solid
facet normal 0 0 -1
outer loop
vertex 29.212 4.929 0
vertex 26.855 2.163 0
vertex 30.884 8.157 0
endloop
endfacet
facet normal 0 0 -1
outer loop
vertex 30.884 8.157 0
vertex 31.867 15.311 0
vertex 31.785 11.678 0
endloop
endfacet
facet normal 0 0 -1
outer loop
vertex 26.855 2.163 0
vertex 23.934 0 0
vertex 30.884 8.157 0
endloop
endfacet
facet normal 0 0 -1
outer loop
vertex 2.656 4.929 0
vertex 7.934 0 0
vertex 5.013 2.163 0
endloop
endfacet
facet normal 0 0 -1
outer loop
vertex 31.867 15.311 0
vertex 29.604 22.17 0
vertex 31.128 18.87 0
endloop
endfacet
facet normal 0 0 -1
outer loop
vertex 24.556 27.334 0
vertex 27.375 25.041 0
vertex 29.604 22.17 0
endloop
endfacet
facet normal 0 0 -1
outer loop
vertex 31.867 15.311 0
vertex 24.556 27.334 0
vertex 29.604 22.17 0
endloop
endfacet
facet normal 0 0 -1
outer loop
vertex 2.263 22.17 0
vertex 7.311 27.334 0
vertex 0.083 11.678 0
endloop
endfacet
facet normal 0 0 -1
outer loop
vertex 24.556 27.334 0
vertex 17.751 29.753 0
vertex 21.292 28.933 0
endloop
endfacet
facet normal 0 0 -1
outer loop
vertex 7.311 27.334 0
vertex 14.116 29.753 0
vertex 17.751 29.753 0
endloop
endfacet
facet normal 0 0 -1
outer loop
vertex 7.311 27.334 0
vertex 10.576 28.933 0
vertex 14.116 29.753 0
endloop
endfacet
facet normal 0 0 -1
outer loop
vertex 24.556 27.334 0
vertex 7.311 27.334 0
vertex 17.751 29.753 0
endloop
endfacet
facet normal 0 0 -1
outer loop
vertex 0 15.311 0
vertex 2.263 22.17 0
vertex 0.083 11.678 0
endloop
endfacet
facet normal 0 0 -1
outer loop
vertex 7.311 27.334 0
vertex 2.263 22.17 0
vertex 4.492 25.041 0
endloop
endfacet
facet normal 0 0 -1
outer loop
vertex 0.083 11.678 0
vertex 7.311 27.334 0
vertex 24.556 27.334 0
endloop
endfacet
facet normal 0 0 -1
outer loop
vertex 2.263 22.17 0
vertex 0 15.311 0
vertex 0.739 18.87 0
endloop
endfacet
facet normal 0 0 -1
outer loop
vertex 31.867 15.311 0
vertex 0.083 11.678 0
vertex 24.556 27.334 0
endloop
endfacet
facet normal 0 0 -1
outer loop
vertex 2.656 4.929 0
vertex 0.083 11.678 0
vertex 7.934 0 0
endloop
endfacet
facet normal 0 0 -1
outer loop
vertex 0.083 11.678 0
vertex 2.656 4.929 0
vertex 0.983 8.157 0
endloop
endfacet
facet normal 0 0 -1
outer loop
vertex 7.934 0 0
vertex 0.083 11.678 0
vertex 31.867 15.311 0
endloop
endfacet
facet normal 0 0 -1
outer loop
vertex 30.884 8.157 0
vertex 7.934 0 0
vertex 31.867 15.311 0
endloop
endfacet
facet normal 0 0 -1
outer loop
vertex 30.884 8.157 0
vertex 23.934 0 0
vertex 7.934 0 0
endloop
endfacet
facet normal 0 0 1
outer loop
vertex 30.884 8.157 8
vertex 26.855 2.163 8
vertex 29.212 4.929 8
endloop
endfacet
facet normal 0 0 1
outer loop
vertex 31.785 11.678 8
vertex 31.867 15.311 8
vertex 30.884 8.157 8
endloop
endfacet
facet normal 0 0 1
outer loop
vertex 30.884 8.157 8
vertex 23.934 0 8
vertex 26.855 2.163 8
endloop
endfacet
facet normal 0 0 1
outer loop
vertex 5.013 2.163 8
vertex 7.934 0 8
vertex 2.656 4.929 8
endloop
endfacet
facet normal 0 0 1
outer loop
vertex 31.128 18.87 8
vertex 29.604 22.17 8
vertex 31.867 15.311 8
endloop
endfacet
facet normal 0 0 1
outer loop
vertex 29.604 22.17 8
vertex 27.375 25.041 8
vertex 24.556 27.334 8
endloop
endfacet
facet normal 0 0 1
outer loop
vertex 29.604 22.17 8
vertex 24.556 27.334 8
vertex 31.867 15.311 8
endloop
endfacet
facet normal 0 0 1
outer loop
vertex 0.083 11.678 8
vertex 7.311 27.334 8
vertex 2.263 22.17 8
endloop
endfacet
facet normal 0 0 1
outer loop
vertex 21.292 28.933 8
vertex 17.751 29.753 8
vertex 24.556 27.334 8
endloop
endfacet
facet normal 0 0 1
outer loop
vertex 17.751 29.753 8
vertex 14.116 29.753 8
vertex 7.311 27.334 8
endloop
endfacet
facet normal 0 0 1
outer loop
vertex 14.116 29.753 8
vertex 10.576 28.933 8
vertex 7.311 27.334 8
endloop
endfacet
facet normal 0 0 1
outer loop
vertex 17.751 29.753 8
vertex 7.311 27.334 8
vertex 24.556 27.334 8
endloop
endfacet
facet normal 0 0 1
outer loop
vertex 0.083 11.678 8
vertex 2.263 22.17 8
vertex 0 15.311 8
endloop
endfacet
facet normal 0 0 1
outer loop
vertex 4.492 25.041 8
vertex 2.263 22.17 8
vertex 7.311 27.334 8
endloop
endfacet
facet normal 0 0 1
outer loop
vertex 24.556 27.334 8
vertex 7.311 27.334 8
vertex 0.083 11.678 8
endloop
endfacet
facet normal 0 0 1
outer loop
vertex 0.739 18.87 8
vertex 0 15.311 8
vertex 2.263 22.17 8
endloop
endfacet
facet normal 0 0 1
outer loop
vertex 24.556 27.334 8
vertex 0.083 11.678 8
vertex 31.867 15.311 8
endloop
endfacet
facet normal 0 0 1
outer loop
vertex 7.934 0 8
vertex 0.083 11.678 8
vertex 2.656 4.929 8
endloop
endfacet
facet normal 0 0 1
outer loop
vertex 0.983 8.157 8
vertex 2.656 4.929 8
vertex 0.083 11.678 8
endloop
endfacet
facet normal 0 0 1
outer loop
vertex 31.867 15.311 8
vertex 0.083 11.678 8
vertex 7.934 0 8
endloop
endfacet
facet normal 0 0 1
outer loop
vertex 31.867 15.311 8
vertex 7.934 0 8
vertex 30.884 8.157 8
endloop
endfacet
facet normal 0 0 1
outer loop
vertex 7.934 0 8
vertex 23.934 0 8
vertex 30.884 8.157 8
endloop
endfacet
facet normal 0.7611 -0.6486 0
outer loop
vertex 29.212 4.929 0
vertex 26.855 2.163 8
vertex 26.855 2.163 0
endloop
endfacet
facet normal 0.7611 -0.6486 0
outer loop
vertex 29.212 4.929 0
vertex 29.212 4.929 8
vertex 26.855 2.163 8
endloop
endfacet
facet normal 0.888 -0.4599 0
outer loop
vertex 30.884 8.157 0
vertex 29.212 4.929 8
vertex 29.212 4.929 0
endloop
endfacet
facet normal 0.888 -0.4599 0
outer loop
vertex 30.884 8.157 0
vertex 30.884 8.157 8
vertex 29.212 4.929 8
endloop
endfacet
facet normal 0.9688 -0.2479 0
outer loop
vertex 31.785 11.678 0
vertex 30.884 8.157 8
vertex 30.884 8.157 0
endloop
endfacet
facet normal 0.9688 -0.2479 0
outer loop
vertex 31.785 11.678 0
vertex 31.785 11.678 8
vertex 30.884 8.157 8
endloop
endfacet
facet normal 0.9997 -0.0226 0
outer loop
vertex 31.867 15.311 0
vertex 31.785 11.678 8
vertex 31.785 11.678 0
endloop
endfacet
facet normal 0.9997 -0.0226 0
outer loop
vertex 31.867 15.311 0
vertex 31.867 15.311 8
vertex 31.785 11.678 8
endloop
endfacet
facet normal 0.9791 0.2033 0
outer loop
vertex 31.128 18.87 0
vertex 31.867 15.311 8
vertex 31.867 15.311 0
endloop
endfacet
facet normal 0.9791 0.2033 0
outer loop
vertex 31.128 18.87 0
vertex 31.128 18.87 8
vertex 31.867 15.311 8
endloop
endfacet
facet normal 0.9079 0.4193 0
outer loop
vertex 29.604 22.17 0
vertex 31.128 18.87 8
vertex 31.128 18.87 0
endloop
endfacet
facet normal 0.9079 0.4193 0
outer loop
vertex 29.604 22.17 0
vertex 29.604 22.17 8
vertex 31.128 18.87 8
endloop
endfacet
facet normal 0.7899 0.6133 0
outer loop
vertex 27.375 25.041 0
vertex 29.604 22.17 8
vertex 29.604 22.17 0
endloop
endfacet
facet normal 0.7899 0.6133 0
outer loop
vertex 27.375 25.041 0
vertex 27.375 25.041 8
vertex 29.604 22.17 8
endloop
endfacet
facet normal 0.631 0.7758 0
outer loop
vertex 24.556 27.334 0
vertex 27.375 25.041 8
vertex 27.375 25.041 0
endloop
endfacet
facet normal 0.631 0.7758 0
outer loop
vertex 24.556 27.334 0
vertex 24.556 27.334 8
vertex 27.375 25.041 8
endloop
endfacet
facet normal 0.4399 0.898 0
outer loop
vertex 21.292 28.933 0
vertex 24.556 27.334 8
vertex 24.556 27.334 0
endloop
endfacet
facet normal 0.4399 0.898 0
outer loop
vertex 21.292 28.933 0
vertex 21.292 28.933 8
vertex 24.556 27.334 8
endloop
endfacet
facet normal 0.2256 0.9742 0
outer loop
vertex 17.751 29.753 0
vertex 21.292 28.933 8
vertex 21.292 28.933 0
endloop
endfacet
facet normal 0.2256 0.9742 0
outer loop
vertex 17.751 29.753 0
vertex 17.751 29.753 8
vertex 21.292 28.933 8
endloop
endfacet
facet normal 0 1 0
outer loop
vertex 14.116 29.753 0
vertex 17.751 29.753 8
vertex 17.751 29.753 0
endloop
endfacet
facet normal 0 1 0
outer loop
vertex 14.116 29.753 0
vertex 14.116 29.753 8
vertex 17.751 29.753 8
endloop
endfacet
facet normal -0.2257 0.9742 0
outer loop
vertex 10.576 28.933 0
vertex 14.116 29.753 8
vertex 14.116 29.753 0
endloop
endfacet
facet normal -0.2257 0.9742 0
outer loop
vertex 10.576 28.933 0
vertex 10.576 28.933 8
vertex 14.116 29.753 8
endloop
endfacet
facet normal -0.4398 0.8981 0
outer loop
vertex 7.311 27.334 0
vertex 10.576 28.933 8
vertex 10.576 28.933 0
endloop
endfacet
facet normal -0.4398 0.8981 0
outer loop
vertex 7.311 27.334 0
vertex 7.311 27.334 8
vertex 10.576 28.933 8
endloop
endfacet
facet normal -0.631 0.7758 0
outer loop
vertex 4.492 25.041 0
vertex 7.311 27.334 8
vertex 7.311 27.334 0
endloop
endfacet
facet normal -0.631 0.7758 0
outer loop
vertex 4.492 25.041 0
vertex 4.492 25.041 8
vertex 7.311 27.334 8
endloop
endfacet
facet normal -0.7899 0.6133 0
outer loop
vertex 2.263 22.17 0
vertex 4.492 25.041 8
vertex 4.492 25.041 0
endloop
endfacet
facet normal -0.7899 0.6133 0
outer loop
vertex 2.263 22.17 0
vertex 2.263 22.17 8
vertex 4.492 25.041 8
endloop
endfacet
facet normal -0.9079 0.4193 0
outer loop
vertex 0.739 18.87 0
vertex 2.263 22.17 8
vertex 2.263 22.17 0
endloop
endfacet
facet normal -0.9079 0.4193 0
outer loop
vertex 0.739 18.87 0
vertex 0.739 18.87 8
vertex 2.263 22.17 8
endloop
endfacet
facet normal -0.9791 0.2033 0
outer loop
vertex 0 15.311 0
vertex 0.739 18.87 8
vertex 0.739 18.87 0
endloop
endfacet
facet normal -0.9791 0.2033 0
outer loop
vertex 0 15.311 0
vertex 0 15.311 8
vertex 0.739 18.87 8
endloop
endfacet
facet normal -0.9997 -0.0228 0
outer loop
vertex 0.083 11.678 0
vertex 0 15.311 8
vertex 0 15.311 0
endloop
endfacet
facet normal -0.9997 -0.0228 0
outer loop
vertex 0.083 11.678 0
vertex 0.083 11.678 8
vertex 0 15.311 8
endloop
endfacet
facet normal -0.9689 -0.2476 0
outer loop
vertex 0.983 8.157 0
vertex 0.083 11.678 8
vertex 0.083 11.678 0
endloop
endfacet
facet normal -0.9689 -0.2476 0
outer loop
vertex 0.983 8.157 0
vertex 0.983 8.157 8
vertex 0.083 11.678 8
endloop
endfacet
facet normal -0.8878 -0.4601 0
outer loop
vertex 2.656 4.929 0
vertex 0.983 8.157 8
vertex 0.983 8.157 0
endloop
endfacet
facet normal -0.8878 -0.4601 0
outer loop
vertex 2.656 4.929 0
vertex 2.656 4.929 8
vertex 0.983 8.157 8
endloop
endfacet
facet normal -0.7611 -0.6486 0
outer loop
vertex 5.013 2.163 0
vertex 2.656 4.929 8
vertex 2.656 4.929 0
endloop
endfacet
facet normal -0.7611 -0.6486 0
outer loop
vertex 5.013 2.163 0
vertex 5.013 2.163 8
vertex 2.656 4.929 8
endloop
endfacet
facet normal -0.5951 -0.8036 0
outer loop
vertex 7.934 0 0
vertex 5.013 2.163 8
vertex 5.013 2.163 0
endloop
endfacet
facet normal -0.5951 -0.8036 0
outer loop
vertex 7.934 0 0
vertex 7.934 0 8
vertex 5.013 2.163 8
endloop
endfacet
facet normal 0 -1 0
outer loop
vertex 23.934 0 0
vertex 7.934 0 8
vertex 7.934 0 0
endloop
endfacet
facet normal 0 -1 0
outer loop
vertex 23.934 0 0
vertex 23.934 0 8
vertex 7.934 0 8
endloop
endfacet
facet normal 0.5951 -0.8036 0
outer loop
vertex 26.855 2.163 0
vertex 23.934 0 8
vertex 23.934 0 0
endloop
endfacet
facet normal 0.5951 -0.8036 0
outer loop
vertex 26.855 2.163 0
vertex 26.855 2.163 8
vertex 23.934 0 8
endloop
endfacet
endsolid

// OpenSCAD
$fn = 32;

// ----------------------------------------------------------------------
// Flat adaptor: single_d, 8 mm thick
// ----------------------------------------------------------------------

// --- parameters (mm) ---
profile_height = 8;       // extrusion height
profile_points = 24;      // points of the closed outline

profile = [[23.934, 0], [26.855, 2.163], [29.212, 4.929], [30.884, 8.157], [31.785, 11.678], [31.867, 15.311], [31.128, 18.87], [29.604, 22.17], [27.375, 25.041], [24.556, 27.334], [21.292, 28.933], [17.751, 29.753], [14.116, 29.753], [10.576, 28.933], [7.311, 27.334], [4.492, 25.041], [2.263, 22.17], [0.739, 18.87], [0, 15.311], [0.083, 11.678], [0.983, 8.157], [2.656, 4.929], [5.013, 2.163], [7.934, 0]];  // single closed polygon, 24 points, counter clockwise

// --- the one profile operation ---
linear_extrude(height = profile_height) polygon(points = profile);
